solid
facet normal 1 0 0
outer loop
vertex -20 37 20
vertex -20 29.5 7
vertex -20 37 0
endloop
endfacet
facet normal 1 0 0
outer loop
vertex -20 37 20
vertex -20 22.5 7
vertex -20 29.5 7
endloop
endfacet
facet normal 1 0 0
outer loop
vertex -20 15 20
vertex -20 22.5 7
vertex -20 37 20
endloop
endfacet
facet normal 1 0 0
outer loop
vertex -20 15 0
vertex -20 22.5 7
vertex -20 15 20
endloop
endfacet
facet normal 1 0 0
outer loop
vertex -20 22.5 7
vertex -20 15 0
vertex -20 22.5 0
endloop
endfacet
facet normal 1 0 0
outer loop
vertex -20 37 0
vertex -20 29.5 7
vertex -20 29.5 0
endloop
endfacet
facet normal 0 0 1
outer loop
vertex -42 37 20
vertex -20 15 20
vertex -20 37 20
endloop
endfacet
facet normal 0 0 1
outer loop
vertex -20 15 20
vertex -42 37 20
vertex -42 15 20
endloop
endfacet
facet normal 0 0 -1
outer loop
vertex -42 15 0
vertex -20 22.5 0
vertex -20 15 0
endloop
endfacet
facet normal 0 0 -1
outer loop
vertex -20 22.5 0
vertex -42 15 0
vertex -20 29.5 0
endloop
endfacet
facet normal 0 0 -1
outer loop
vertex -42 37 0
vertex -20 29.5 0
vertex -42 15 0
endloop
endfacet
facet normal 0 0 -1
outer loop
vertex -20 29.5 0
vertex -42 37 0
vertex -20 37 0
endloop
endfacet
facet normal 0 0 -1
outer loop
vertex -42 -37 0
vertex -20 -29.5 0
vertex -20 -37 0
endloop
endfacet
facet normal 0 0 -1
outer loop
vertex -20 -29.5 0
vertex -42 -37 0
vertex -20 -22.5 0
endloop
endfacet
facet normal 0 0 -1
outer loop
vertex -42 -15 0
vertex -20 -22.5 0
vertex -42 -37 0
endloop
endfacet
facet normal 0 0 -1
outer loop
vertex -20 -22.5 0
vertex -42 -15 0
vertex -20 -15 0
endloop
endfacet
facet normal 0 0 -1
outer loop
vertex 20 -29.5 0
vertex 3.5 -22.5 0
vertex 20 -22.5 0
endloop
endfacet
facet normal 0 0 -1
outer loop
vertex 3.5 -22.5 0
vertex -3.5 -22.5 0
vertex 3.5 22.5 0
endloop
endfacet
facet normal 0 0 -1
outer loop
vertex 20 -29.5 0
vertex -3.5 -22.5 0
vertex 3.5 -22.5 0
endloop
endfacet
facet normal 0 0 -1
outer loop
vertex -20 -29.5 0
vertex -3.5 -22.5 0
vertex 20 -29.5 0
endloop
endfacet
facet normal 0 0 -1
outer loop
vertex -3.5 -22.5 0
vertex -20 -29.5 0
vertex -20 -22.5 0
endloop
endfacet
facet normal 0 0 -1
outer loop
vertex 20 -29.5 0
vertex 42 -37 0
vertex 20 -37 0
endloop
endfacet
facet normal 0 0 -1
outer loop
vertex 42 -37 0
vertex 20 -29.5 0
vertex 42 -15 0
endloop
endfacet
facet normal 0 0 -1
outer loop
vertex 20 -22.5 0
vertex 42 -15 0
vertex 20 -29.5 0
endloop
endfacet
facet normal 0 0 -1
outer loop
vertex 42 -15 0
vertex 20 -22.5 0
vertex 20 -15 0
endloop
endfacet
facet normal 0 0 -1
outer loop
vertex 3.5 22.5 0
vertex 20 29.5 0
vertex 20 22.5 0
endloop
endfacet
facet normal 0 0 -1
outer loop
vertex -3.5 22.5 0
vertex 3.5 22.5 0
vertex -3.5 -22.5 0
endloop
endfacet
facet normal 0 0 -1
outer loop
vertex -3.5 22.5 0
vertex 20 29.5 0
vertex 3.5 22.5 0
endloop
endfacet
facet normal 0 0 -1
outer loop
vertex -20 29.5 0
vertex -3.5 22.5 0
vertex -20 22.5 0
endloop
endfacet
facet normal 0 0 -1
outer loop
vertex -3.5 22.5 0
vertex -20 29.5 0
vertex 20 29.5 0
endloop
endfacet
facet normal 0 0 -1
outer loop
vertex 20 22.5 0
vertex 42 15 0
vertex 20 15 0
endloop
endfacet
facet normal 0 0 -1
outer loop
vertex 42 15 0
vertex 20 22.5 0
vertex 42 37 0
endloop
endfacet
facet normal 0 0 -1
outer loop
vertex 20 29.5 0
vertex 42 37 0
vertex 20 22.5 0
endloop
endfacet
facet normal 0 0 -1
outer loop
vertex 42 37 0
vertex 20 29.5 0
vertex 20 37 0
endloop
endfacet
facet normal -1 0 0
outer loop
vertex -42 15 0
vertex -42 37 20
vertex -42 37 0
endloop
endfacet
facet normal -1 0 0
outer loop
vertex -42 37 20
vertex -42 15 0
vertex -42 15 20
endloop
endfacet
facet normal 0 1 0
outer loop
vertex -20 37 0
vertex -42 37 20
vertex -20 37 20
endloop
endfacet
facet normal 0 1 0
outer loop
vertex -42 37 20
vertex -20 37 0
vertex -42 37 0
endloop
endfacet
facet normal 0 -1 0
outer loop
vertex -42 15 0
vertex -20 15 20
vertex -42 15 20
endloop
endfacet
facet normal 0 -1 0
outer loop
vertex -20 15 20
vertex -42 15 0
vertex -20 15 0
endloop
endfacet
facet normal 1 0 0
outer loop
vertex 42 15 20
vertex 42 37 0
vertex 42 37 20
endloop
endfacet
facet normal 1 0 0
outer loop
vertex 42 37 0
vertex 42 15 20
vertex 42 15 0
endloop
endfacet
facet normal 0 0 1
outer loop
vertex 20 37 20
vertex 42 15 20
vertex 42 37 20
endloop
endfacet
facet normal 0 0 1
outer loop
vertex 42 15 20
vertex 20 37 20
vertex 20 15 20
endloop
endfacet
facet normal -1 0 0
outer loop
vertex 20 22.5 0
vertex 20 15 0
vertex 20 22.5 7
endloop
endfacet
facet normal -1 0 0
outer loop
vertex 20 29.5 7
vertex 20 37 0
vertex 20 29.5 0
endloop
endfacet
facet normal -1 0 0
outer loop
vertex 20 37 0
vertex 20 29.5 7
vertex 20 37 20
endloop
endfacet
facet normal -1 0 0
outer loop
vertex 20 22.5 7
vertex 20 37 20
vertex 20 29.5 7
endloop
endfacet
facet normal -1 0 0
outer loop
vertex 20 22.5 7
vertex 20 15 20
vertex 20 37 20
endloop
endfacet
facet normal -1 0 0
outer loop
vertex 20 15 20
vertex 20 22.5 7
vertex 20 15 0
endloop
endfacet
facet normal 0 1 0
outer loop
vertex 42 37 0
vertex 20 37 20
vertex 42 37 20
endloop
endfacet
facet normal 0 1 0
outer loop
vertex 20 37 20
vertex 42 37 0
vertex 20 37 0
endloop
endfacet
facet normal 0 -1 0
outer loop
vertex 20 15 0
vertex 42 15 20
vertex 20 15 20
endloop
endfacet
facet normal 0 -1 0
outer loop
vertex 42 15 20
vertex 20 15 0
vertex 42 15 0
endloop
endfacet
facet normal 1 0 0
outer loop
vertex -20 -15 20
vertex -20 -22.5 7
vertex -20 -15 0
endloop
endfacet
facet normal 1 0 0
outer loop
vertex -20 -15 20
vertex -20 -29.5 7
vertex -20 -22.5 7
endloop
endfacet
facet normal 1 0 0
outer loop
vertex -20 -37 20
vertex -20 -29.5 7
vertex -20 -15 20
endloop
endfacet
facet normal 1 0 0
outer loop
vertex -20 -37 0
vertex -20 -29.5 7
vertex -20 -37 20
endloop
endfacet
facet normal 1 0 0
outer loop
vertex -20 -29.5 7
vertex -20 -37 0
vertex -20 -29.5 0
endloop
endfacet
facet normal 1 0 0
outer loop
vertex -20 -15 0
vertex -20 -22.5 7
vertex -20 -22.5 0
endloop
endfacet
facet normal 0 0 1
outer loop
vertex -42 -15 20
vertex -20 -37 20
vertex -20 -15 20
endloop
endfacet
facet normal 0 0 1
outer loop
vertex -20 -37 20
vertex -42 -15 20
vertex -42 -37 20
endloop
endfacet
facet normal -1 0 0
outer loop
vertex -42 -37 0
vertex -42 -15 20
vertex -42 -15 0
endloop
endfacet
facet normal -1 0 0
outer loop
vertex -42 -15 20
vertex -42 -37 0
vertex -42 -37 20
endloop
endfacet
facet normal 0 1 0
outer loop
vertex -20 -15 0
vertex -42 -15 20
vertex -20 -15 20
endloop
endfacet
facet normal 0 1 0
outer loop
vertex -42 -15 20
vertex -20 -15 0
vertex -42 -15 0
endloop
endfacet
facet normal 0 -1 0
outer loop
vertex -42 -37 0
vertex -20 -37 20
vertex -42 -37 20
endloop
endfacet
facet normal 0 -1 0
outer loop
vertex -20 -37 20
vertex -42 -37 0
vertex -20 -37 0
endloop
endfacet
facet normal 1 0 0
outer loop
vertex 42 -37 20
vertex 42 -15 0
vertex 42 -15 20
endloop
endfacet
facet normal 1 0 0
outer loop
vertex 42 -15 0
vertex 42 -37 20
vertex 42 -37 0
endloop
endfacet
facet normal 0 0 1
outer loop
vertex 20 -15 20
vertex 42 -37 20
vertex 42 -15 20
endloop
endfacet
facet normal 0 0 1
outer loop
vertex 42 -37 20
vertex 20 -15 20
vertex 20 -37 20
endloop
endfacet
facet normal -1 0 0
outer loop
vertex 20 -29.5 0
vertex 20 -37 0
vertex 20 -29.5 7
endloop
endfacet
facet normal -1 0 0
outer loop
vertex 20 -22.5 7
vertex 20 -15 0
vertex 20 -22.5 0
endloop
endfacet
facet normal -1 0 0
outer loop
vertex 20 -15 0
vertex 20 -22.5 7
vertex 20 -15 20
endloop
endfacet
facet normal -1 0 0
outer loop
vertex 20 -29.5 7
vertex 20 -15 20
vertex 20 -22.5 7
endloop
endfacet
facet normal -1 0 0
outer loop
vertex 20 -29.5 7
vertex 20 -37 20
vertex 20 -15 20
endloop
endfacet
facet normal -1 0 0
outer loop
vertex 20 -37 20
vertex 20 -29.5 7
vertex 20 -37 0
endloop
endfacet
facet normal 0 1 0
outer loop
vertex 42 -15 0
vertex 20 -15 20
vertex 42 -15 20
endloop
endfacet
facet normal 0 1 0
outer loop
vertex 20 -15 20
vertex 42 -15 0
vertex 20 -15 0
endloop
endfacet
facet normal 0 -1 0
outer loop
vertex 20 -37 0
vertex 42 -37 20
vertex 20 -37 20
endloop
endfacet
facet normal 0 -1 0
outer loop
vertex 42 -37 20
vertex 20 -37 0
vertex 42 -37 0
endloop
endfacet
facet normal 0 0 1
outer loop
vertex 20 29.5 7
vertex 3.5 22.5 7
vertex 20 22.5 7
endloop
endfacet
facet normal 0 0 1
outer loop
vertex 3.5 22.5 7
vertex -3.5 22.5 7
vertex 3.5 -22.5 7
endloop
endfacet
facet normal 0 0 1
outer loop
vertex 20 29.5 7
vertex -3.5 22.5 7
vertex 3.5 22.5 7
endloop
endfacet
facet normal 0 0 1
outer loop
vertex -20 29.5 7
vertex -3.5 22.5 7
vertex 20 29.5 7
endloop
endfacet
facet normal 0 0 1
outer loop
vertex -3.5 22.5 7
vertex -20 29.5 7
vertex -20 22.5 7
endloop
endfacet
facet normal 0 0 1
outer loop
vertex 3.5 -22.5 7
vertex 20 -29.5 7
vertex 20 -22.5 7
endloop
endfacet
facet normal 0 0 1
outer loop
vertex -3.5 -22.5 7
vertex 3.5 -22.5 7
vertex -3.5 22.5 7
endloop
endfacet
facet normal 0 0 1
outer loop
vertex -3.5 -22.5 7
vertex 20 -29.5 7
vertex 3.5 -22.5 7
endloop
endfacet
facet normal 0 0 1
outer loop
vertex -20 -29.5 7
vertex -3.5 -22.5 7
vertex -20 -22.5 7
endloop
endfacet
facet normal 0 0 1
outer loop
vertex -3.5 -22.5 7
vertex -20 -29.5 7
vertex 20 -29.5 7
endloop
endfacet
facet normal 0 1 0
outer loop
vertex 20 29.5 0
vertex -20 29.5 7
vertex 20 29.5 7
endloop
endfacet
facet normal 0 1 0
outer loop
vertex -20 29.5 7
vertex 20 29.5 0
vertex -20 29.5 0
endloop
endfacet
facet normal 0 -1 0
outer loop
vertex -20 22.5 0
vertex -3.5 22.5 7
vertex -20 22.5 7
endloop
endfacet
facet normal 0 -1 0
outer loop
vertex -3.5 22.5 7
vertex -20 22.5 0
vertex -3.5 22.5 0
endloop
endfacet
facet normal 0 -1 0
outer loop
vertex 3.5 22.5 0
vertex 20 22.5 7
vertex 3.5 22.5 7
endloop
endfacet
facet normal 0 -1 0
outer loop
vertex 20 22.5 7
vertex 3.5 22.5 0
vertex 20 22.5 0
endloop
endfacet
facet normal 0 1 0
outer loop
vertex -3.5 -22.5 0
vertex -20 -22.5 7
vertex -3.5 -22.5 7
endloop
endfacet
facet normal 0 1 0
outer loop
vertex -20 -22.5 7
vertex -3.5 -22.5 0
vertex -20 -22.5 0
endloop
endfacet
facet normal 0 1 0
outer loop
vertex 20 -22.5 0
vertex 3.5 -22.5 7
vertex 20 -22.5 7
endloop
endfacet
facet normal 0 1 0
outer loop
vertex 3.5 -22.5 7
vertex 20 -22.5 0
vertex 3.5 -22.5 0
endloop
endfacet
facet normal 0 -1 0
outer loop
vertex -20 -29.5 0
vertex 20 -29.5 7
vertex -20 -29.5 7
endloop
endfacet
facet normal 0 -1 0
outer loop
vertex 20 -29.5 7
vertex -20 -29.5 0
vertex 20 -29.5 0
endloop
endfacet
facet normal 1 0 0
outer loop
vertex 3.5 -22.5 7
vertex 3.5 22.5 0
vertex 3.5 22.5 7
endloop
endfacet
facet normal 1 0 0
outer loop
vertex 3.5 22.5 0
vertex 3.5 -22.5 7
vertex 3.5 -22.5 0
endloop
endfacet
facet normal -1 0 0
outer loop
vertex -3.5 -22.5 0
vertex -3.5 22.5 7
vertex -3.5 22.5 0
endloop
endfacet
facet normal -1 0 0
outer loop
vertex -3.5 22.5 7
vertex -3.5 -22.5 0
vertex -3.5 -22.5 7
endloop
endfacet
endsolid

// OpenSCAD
// body3.scad
// 工字形结构 —— 两条水平横梁 + 中间竖梁，四端各带一个矩形块
//   I-beam (工) frame with a rectangular block at each of the 4 ends
// 单位: mm

// ================= 参数 =================
// 矩形块 (四端)
box_l = 22;   // X 方向长度
box_w = 22;   // Y 方向宽度
box_h = 20;   // Z 方向高度

// 连接梁
bar_w = 7;    // 梁宽度
bar_h = 7;    // 梁高度 (Z 厚度)

// 整体跨距 (按矩形块中心计)
span_x = 62;  // 左右两块中心间距 = 上/下横梁长度
span_y = 52;  // 上下两横梁中心间距 = 竖梁长度

// ================= 模块 =================
// 矩形块, 底面落在 z=0
module rbox(cx, cy) {
    translate([cx, cy, box_h / 2])
        cube([box_l, box_w, box_h], center = true);
}

// 水平横梁 (沿 X), 底面落在 z=0; 长度取中心间距以嵌入两端方块
module hbar(cy) {
    translate([0, cy, bar_h / 2])
        cube([span_x, bar_w, bar_h], center = true);
}

// 中间竖梁 (沿 Y, 居中), 底面落在 z=0; 长度取上下横梁间距以连接两梁
module vbar() {
    translate([0, 0, bar_h / 2])
        cube([bar_w, span_y, bar_h], center = true);
}

// ================= 装配 =================
union() {
    // 四个矩形块 (四端)
    rbox(-span_x / 2,  span_y / 2);   // 左上
    rbox( span_x / 2,  span_y / 2);   // 右上
    rbox(-span_x / 2, -span_y / 2);   // 左下
    rbox( span_x / 2, -span_y / 2);   // 右下

    // 工字: 上横梁 + 下横梁 + 中间竖梁
    hbar( span_y / 2);   // 上横梁
    hbar(-span_y / 2);   // 下横梁
    vbar();              // 中间竖梁
}
